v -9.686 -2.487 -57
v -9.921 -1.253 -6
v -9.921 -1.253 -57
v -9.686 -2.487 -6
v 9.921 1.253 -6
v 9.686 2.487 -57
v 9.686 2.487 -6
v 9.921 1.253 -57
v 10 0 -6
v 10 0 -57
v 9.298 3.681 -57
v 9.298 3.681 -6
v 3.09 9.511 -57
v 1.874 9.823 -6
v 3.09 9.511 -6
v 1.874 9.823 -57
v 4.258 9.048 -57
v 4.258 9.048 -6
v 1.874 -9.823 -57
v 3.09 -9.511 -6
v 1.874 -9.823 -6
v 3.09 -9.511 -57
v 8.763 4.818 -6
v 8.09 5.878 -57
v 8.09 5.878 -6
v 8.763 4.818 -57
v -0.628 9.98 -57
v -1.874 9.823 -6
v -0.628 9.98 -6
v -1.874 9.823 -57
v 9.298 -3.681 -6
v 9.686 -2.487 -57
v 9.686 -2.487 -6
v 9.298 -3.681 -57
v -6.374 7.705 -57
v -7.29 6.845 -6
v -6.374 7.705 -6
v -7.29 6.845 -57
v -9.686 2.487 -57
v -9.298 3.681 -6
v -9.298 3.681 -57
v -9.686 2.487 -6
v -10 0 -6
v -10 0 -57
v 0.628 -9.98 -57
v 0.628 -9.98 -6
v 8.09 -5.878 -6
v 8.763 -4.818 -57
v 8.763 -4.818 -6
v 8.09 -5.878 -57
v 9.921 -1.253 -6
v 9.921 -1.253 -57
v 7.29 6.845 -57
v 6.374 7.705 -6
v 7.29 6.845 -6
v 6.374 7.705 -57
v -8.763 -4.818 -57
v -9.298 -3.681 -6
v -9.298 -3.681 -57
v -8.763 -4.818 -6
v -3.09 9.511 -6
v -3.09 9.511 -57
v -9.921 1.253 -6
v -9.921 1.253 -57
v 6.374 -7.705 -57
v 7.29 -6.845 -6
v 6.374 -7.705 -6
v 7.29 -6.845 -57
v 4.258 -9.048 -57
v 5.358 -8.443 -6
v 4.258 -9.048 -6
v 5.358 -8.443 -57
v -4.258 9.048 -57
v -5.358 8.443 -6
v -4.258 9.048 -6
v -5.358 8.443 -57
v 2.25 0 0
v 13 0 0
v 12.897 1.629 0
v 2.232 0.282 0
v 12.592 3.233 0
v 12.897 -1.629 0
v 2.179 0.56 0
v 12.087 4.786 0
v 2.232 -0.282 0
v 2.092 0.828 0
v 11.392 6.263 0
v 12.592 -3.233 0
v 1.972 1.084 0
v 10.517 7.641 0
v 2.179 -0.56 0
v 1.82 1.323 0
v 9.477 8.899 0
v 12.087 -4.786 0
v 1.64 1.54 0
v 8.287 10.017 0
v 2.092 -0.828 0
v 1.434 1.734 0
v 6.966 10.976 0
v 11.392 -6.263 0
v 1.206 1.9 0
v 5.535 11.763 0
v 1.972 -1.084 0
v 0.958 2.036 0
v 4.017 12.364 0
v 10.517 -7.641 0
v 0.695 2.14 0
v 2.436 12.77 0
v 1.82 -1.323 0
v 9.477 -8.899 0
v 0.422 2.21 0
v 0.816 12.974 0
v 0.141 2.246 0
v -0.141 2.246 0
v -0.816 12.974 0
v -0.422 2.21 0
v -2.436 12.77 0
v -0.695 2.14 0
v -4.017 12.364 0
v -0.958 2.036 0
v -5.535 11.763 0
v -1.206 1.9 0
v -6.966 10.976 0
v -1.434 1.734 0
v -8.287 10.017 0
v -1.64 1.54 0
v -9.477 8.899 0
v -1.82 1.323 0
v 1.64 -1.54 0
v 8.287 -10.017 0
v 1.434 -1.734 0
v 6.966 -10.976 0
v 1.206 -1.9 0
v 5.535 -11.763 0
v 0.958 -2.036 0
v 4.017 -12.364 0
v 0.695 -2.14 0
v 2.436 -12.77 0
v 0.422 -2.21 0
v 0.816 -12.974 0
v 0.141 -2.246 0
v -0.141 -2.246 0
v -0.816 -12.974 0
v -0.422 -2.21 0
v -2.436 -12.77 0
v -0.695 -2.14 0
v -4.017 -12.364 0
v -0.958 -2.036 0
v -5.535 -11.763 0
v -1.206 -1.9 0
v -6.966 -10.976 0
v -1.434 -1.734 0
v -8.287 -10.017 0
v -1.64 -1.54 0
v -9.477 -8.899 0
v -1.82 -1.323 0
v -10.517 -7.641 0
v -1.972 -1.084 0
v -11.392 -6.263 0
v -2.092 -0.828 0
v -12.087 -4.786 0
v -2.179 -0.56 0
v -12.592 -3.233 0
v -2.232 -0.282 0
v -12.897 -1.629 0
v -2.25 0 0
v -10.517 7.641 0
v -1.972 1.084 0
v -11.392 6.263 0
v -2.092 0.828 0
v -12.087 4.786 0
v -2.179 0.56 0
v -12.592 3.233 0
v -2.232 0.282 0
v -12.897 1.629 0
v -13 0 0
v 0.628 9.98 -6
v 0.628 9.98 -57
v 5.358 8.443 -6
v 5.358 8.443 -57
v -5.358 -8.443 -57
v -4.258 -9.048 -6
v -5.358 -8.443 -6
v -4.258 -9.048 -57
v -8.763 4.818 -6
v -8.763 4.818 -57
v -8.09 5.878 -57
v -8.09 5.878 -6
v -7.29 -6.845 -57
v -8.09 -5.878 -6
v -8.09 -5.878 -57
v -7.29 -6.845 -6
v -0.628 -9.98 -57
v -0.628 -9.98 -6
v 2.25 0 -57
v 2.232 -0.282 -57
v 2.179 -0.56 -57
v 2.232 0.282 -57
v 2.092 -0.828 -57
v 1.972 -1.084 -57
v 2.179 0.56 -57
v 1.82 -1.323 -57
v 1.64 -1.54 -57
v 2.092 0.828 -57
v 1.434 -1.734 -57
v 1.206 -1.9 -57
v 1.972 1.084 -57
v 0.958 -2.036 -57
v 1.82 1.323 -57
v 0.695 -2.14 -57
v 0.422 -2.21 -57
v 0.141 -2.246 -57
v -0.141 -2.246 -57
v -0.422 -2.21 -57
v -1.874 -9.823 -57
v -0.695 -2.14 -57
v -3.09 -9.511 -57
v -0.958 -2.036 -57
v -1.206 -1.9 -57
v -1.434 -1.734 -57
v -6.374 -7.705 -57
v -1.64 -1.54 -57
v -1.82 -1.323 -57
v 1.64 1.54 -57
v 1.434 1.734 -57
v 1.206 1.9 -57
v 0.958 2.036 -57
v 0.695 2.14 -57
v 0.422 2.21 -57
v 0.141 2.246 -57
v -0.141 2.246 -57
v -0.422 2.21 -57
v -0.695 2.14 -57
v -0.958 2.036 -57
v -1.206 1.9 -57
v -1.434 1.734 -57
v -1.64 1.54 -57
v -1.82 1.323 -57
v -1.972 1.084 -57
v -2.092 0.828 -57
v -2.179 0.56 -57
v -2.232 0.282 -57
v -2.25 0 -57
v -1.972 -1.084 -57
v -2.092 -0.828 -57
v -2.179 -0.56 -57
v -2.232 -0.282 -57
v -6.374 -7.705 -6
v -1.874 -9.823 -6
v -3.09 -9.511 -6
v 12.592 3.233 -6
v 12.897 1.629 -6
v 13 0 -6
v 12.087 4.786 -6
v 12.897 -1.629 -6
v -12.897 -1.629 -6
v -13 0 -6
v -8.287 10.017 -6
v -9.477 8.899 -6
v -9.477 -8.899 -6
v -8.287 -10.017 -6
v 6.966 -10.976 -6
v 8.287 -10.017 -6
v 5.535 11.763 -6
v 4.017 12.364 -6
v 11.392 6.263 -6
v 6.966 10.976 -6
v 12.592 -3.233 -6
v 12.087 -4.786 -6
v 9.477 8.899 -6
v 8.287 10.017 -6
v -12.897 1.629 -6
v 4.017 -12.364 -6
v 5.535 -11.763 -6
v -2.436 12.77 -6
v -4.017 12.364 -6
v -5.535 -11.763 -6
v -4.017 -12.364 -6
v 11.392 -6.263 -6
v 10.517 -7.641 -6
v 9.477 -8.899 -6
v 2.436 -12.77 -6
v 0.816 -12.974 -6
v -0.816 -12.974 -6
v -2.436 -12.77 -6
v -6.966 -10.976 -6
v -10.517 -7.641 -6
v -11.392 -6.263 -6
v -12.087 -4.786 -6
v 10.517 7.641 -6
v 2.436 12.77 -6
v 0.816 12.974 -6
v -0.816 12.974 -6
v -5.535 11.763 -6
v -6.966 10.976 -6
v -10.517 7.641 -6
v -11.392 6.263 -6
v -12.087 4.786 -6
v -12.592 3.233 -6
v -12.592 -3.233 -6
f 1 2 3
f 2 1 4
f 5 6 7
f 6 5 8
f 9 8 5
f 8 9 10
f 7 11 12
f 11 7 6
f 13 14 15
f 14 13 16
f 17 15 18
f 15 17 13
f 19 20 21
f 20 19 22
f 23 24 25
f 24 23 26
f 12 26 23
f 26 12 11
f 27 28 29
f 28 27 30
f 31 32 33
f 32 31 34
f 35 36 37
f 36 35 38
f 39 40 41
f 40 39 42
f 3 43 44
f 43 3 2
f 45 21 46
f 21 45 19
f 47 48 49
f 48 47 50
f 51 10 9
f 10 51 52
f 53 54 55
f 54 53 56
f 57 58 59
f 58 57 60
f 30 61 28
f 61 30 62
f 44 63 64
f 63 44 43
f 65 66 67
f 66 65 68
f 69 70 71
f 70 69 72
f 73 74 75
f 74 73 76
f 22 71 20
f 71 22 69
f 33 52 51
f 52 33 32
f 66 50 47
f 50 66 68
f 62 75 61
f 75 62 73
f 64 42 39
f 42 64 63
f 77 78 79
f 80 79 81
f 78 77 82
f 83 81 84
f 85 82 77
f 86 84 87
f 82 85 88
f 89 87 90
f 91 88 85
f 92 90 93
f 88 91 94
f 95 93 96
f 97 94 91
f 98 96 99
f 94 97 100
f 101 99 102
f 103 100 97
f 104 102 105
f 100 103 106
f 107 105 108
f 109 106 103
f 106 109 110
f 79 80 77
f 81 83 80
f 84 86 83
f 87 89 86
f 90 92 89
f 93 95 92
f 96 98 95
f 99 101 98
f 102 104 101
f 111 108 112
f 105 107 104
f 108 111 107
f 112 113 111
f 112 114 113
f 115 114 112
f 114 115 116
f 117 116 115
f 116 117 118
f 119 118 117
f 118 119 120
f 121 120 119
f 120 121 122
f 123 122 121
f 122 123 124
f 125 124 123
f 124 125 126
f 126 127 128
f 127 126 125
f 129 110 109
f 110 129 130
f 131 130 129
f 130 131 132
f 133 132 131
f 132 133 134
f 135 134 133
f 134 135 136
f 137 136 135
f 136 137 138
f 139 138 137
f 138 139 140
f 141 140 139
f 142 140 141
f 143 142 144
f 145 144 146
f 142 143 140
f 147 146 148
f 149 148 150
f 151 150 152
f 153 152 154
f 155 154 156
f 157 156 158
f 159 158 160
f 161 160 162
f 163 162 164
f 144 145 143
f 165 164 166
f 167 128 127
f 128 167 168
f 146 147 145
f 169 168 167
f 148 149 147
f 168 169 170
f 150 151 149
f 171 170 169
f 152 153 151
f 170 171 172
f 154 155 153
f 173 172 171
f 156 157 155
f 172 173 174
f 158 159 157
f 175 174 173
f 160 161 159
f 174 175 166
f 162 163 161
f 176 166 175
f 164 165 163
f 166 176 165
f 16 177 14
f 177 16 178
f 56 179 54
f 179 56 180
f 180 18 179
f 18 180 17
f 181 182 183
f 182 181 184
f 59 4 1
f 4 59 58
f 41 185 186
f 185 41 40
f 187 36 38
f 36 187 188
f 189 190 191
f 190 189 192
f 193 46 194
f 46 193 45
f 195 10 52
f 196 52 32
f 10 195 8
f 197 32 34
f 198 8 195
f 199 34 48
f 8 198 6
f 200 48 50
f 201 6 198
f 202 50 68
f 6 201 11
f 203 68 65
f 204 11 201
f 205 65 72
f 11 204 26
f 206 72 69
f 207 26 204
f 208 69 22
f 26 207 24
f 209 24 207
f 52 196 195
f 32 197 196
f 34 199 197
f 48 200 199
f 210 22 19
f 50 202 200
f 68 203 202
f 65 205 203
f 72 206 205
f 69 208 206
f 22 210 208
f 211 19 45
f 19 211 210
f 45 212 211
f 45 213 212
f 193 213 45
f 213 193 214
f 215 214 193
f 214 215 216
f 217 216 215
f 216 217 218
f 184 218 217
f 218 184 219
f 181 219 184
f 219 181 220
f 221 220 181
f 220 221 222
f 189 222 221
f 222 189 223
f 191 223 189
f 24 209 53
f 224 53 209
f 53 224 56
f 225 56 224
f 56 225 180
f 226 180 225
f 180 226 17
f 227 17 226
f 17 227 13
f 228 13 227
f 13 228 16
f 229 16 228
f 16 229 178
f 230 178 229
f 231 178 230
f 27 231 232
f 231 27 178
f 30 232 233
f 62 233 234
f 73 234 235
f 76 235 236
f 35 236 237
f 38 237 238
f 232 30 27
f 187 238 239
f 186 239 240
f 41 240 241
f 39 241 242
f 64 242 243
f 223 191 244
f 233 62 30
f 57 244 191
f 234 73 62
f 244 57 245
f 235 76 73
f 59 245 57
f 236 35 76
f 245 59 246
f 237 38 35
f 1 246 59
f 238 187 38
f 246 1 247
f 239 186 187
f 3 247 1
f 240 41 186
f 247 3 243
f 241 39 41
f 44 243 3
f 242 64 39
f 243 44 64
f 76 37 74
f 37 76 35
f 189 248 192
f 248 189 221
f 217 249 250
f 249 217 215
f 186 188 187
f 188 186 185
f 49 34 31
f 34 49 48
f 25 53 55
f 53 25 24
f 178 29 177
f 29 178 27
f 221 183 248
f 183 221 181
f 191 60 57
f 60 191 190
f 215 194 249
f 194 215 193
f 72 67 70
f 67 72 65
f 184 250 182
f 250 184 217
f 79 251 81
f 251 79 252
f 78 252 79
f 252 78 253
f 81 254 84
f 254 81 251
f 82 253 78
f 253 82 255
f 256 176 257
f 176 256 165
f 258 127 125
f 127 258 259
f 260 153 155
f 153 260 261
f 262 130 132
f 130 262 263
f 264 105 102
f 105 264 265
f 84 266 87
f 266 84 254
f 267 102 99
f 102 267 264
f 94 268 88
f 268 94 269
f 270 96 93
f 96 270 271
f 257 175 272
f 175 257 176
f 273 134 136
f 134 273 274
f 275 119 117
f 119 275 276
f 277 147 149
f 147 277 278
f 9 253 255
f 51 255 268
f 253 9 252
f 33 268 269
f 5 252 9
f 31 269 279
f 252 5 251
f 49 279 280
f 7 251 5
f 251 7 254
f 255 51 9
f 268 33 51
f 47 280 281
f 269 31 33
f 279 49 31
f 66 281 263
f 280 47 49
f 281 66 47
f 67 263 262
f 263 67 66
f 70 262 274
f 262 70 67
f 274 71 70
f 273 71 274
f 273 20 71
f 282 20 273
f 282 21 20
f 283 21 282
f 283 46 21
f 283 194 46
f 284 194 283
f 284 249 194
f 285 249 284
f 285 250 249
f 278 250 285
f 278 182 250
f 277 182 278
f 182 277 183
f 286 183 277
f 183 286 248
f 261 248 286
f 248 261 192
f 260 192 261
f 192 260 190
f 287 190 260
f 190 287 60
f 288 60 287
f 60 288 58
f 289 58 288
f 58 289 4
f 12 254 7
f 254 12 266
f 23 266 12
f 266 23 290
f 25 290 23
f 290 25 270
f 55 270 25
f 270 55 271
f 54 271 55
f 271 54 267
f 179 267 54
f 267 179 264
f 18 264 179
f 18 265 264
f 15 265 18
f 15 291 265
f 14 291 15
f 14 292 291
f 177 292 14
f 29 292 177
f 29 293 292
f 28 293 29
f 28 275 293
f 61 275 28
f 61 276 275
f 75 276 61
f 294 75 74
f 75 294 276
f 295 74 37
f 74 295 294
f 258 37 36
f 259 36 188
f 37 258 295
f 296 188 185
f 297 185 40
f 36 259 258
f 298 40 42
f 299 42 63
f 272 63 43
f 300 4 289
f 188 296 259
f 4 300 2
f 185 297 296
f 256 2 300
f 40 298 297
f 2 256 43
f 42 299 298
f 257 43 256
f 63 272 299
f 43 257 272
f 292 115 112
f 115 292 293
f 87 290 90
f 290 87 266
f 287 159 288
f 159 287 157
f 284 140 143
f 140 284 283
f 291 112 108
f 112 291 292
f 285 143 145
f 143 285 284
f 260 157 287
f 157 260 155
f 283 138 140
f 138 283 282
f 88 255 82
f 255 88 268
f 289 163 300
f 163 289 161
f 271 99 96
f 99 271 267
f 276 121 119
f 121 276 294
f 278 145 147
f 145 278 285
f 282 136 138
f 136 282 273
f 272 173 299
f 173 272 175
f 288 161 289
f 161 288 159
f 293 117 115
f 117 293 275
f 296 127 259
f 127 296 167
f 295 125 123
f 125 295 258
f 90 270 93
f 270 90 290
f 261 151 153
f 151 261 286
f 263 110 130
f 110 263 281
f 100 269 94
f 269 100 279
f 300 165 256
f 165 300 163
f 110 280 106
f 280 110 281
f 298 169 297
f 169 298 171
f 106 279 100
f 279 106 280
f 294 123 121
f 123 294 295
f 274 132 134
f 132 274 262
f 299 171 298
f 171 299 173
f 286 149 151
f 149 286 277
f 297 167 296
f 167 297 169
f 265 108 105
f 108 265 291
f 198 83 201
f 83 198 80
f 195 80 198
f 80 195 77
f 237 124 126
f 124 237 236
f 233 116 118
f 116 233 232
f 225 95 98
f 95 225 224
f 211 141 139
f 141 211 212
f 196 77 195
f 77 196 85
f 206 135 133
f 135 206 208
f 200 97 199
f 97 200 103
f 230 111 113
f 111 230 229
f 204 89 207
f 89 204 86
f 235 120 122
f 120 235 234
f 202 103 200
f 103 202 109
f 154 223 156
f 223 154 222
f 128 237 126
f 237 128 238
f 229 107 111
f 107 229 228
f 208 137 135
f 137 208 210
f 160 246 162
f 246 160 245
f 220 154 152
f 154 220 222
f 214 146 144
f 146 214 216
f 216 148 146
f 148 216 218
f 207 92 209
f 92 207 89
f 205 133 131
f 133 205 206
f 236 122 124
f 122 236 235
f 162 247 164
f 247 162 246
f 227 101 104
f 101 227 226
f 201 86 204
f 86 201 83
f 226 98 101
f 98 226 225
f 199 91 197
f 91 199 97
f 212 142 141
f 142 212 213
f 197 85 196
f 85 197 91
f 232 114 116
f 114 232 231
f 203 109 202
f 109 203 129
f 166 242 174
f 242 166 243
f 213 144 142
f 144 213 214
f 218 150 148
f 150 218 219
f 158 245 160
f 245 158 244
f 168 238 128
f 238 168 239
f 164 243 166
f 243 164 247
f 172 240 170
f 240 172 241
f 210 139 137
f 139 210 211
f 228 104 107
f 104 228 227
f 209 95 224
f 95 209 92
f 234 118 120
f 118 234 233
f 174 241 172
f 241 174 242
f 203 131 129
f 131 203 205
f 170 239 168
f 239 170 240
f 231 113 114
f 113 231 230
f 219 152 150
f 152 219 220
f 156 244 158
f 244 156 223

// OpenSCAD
$fn = 50;


difference() {
	union() {
		translate(v = [0, 0, -57.0000000000]) {
			cylinder(h = 57, r = 10.0000000000);
		}
		translate(v = [0, 0, -6.0000000000]) {
			cylinder(h = 6, r = 13.0000000000);
		}
	}
	union() {
		#translate(v = [0, 0, -57]) {
			cylinder(h = 57, r = 2.2500000000);
		}
	}
}
